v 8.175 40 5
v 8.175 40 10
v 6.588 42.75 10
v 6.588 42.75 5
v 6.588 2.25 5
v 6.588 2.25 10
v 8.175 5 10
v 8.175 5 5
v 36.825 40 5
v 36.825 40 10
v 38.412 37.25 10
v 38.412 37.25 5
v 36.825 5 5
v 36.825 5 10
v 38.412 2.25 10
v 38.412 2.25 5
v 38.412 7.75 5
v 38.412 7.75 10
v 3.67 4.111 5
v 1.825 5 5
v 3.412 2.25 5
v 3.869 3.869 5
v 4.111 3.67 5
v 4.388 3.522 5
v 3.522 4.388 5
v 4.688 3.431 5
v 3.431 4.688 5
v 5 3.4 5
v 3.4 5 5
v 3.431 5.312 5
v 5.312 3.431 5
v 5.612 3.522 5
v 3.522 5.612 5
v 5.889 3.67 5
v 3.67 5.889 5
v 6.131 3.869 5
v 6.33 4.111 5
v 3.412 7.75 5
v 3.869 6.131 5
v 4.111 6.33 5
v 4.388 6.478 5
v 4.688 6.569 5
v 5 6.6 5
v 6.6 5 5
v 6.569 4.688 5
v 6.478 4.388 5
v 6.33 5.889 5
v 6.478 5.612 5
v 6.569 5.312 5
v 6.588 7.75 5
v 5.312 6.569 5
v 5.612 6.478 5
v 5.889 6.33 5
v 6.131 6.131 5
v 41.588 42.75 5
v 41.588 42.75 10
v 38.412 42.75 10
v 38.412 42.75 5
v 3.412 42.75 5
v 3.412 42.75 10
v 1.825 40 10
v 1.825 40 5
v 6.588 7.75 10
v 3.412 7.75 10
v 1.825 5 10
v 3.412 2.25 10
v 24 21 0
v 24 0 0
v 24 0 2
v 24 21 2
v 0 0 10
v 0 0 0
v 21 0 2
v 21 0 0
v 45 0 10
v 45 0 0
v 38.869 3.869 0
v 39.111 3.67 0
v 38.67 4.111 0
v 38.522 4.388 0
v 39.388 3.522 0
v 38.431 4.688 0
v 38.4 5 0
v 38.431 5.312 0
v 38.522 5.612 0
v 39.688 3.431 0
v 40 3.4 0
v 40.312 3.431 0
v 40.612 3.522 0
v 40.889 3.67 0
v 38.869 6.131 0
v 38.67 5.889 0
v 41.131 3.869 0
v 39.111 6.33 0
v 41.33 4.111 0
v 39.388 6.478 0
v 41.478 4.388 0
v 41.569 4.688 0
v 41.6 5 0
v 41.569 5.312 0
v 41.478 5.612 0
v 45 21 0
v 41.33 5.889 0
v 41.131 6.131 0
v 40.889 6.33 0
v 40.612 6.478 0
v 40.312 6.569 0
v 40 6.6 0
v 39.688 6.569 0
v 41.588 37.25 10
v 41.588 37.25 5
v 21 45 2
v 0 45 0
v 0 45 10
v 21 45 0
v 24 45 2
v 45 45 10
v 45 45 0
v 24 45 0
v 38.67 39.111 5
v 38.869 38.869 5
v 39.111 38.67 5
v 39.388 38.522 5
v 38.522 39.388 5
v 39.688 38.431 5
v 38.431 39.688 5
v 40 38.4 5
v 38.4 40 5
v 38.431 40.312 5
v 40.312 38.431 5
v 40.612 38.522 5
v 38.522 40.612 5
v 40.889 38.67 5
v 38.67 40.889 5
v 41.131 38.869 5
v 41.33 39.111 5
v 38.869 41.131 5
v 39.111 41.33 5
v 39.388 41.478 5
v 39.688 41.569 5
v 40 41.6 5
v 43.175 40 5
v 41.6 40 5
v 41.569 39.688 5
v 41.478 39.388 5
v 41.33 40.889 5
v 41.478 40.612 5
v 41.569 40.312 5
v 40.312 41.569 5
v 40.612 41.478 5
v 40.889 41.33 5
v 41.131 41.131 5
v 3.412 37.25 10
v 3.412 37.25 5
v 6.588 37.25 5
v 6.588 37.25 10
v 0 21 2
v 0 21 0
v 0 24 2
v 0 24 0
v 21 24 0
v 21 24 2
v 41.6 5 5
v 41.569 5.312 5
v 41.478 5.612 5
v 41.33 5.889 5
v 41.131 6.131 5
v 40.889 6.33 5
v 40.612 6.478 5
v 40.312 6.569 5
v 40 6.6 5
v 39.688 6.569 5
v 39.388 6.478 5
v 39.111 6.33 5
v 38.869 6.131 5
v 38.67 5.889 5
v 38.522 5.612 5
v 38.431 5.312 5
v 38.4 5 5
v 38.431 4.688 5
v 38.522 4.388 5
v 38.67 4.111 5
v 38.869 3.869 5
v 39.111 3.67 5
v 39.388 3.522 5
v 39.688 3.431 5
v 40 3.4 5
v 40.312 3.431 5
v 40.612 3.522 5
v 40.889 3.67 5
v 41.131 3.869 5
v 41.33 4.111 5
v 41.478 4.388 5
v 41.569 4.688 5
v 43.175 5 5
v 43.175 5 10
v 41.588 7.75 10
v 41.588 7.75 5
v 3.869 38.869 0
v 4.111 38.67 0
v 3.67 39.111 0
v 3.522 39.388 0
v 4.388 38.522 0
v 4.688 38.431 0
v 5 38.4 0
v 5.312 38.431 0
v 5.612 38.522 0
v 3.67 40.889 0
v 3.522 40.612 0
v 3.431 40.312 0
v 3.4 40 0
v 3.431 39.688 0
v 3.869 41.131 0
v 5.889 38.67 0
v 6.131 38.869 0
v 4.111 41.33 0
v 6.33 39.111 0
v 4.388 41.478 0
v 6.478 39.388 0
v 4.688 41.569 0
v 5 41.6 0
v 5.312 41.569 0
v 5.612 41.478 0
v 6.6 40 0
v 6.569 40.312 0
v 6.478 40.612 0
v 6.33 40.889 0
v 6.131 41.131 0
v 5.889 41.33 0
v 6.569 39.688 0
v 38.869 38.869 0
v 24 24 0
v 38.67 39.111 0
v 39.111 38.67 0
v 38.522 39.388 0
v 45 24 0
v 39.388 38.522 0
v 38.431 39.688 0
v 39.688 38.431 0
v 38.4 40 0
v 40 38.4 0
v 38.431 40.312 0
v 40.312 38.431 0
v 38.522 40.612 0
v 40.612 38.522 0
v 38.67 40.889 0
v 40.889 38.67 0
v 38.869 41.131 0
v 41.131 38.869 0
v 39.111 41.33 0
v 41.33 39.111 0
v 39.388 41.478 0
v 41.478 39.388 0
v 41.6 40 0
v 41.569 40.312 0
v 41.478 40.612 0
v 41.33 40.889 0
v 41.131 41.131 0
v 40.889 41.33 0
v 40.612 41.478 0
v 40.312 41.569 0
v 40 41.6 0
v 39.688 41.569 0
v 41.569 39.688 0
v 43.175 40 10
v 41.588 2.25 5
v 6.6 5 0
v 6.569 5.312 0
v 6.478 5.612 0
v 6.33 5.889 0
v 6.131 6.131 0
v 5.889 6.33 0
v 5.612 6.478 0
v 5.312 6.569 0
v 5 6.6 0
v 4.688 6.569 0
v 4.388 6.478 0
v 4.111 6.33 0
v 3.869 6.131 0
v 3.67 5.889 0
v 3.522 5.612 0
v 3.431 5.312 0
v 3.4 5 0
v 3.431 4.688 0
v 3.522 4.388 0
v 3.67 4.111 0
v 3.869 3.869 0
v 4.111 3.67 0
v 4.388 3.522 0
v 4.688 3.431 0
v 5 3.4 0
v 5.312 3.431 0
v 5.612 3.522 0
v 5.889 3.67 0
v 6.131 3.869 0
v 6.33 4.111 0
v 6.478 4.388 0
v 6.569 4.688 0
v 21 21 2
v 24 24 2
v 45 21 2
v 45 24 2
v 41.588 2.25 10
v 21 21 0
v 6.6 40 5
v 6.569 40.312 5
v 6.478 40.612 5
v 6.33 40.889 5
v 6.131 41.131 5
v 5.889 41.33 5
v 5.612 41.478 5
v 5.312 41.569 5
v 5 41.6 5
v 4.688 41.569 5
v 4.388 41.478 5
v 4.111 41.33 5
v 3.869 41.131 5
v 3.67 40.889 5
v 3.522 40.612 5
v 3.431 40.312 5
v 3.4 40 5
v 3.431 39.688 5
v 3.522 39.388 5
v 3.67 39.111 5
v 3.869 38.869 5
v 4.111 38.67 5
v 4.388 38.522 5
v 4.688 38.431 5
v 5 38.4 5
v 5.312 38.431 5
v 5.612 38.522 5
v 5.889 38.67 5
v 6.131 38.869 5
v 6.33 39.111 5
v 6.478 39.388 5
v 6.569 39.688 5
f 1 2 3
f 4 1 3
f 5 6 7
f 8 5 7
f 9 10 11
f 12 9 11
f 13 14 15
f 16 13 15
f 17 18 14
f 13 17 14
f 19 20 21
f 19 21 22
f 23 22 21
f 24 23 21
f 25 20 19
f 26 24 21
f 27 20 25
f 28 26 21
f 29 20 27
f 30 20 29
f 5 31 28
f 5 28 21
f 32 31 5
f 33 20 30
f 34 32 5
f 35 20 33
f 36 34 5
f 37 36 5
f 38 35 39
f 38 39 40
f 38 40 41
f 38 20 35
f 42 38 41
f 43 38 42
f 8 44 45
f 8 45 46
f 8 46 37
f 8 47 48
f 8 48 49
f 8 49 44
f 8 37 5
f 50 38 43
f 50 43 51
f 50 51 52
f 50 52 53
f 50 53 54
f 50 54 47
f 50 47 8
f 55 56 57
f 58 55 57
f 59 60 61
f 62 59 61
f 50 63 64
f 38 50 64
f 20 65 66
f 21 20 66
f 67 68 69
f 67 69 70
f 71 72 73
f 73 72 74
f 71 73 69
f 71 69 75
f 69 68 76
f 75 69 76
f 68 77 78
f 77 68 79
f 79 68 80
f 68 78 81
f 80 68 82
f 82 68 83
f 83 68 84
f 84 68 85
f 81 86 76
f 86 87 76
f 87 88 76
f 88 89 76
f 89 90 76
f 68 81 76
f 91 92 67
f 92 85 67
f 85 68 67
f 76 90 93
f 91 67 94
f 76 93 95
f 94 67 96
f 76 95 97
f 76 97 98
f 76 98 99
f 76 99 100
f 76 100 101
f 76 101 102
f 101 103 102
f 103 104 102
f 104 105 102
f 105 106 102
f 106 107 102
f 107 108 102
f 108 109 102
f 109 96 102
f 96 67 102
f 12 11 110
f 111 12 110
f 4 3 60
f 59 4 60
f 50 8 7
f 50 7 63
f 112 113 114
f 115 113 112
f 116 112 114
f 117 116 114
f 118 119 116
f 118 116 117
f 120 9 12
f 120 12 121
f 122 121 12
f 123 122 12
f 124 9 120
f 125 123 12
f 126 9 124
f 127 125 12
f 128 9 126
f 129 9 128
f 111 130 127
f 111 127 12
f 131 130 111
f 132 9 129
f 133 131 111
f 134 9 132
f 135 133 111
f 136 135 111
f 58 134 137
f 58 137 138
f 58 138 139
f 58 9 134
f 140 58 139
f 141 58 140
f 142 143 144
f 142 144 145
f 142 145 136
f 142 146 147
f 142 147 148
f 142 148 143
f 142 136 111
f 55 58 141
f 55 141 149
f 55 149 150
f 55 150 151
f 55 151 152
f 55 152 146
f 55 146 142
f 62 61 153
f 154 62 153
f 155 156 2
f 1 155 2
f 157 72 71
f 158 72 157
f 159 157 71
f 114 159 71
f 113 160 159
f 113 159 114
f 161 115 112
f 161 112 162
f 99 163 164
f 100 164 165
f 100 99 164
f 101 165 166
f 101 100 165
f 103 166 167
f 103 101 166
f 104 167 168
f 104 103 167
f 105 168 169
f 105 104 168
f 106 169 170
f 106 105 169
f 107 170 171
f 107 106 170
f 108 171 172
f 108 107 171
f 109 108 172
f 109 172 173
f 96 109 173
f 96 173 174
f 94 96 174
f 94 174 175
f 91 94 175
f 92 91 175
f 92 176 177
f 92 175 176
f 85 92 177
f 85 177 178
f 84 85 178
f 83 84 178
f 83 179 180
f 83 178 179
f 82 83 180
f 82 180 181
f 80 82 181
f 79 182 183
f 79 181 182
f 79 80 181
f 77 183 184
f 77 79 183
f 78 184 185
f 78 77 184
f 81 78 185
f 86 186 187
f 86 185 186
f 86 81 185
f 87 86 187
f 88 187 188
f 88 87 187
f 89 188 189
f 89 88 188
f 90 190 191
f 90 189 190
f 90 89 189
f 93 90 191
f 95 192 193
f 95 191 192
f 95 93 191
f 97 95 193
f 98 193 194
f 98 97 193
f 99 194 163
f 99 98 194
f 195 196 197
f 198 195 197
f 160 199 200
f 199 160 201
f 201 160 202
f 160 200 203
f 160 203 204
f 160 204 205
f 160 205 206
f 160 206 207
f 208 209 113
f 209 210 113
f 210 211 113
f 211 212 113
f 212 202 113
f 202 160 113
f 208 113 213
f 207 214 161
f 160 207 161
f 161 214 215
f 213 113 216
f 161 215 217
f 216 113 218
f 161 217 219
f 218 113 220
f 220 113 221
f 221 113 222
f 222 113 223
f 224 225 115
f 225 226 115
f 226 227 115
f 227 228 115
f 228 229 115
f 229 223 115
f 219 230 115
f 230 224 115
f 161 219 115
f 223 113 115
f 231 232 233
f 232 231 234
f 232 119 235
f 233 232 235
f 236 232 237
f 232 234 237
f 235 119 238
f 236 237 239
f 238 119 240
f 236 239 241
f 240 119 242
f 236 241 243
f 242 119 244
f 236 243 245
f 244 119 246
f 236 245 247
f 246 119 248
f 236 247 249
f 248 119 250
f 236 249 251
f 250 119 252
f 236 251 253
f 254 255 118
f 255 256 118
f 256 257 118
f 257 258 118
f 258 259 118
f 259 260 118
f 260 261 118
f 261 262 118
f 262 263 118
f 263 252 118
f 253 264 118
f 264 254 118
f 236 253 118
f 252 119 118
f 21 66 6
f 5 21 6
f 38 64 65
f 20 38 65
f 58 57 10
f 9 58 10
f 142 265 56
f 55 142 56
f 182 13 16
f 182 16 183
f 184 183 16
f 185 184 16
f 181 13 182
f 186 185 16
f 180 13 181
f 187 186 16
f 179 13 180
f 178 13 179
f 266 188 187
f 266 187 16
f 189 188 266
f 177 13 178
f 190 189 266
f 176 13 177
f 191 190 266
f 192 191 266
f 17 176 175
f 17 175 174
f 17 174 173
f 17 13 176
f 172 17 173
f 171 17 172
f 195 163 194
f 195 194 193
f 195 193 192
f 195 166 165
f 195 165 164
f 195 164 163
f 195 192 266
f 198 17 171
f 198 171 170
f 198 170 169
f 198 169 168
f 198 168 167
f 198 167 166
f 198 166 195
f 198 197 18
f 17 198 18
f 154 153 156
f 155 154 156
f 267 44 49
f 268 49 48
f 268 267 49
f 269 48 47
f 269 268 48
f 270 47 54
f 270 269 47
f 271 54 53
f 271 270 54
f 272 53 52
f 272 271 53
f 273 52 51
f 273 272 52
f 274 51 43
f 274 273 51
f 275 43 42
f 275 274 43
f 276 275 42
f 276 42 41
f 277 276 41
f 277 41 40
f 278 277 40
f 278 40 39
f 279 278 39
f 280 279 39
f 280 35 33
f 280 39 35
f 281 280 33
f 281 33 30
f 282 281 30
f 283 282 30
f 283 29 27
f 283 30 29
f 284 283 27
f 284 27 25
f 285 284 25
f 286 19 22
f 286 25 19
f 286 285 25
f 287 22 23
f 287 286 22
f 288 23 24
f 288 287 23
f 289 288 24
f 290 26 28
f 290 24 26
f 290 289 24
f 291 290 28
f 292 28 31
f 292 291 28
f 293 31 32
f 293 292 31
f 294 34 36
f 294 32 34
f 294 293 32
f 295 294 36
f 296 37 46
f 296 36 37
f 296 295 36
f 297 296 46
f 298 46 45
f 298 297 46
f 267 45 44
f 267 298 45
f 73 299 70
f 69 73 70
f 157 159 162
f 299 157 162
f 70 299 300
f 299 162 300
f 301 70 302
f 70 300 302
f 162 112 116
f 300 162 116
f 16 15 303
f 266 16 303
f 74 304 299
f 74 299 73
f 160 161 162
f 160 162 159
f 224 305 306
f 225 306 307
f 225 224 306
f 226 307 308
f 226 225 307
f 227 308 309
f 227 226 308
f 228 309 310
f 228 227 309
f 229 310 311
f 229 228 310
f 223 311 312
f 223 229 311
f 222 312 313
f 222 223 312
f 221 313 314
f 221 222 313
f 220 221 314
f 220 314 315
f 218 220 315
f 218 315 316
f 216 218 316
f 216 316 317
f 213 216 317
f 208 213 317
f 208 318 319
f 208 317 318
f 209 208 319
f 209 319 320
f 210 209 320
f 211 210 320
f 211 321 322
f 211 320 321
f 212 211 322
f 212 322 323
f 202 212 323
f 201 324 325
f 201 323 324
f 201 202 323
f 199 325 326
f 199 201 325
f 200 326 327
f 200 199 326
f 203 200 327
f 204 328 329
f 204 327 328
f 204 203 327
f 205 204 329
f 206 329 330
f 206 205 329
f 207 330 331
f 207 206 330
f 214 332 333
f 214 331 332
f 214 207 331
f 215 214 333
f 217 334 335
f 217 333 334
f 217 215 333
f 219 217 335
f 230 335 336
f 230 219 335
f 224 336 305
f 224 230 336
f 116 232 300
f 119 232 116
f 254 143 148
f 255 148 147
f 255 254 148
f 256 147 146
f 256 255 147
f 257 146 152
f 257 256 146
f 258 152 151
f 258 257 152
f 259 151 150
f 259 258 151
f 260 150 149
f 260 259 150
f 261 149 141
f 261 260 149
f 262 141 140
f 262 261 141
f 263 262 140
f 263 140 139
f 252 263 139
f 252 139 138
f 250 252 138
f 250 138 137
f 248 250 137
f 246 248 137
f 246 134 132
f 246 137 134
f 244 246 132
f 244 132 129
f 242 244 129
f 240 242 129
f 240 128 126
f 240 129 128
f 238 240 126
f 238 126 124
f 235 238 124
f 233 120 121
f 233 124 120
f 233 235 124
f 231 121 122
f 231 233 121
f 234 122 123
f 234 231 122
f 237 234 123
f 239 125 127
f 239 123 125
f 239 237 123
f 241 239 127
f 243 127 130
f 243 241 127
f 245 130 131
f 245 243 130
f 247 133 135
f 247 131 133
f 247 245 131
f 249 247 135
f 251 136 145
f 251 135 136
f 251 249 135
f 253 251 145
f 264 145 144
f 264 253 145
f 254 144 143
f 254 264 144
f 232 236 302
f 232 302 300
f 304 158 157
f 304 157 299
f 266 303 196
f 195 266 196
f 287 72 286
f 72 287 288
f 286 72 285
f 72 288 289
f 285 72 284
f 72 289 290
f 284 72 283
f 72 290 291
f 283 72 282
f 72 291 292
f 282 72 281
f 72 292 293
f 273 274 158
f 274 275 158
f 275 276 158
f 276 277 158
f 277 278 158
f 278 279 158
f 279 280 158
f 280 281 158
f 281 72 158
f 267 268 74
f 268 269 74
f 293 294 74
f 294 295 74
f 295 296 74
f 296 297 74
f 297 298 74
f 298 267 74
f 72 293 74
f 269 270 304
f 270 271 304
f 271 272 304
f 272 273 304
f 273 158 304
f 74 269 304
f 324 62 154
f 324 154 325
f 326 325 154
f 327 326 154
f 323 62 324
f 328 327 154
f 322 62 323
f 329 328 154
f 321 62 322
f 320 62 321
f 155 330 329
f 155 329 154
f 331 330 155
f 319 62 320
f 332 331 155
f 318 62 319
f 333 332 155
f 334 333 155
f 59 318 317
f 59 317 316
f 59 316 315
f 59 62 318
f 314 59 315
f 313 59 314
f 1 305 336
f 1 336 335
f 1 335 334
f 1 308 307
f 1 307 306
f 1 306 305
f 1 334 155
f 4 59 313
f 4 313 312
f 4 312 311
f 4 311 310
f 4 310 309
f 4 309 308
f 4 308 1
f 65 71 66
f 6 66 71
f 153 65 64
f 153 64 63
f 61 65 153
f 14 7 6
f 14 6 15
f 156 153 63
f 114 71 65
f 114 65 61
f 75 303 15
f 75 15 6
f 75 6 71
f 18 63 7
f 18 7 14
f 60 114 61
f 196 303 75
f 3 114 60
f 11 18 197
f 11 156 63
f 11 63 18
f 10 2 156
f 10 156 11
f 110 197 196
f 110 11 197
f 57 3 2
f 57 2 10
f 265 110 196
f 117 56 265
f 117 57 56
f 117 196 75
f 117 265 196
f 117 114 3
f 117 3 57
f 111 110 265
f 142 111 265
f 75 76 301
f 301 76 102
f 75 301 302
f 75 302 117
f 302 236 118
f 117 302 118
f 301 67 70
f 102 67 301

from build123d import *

# Parameters (mm, degrees)
SKETCH1_W           = 45
SKETCH1_H           = 45
SKETCH1_R           = 1.6
BOSS_EXTRUDE1_DEPTH = 10
CUT_EXTRUDE1_DEPTH  = 5
CUT_EXTRUDE2_DEPTH  = 2


with BuildPart() as part:
    # Sketch1 → Boss-Extrude1 (new body)
    with BuildSketch(Plane.XY):
        with Locations((22.5, 22.5)):
            Rectangle(SKETCH1_W, SKETCH1_H)
        with Locations((5, 5)):
            Circle(SKETCH1_R, mode=Mode.SUBTRACT)
        with Locations((5, 40)):
            Circle(SKETCH1_R, mode=Mode.SUBTRACT)
        with Locations((40, 40)):
            Circle(SKETCH1_R, mode=Mode.SUBTRACT)
        with Locations((40, 5)):
            Circle(SKETCH1_R, mode=Mode.SUBTRACT)
    extrude(amount=BOSS_EXTRUDE1_DEPTH)

    # Sketch2 → Cut-Extrude1 (cut)
    with BuildSketch(Plane.XY.offset(10)):
        Polygon((8.175426481, 5), (6.58771324, 7.75), (3.41228676, 7.75), (1.824573519, 5), (3.41228676, 2.25), (6.58771324, 2.25), align=None)
        Polygon((8.175426481, 40), (6.58771324, 42.75), (3.41228676, 42.75), (1.824573519, 40), (3.41228676, 37.25), (6.58771324, 37.25), align=None)
        Polygon((43.175426481, 40), (41.58771324, 42.75), (38.41228676, 42.75), (36.824573519, 40), (38.41228676, 37.25), (41.58771324, 37.25), align=None)
        Polygon((43.175426481, 5), (41.58771324, 7.75), (38.41228676, 7.75), (36.824573519, 5), (38.41228676, 2.25), (41.58771324, 2.25), align=None)
    extrude(amount=-CUT_EXTRUDE1_DEPTH, mode=Mode.SUBTRACT)

    # Sketch3 → Cut-Extrude2 (cut)
    with BuildSketch(Plane(origin=(0, 0, 0), x_dir=(-1, 0, 0), z_dir=(0, 0, -1))):
        Polygon((-45, 24), (-24, 24), (-24, 45), (-21, 45), (-21, 24), (0, 24), (0, 21), (-21, 21), (-21, 0), (-24, 0), (-24, 21), (-45, 21), align=None)
    extrude(amount=-CUT_EXTRUDE2_DEPTH, mode=Mode.SUBTRACT)


solid = part.part
